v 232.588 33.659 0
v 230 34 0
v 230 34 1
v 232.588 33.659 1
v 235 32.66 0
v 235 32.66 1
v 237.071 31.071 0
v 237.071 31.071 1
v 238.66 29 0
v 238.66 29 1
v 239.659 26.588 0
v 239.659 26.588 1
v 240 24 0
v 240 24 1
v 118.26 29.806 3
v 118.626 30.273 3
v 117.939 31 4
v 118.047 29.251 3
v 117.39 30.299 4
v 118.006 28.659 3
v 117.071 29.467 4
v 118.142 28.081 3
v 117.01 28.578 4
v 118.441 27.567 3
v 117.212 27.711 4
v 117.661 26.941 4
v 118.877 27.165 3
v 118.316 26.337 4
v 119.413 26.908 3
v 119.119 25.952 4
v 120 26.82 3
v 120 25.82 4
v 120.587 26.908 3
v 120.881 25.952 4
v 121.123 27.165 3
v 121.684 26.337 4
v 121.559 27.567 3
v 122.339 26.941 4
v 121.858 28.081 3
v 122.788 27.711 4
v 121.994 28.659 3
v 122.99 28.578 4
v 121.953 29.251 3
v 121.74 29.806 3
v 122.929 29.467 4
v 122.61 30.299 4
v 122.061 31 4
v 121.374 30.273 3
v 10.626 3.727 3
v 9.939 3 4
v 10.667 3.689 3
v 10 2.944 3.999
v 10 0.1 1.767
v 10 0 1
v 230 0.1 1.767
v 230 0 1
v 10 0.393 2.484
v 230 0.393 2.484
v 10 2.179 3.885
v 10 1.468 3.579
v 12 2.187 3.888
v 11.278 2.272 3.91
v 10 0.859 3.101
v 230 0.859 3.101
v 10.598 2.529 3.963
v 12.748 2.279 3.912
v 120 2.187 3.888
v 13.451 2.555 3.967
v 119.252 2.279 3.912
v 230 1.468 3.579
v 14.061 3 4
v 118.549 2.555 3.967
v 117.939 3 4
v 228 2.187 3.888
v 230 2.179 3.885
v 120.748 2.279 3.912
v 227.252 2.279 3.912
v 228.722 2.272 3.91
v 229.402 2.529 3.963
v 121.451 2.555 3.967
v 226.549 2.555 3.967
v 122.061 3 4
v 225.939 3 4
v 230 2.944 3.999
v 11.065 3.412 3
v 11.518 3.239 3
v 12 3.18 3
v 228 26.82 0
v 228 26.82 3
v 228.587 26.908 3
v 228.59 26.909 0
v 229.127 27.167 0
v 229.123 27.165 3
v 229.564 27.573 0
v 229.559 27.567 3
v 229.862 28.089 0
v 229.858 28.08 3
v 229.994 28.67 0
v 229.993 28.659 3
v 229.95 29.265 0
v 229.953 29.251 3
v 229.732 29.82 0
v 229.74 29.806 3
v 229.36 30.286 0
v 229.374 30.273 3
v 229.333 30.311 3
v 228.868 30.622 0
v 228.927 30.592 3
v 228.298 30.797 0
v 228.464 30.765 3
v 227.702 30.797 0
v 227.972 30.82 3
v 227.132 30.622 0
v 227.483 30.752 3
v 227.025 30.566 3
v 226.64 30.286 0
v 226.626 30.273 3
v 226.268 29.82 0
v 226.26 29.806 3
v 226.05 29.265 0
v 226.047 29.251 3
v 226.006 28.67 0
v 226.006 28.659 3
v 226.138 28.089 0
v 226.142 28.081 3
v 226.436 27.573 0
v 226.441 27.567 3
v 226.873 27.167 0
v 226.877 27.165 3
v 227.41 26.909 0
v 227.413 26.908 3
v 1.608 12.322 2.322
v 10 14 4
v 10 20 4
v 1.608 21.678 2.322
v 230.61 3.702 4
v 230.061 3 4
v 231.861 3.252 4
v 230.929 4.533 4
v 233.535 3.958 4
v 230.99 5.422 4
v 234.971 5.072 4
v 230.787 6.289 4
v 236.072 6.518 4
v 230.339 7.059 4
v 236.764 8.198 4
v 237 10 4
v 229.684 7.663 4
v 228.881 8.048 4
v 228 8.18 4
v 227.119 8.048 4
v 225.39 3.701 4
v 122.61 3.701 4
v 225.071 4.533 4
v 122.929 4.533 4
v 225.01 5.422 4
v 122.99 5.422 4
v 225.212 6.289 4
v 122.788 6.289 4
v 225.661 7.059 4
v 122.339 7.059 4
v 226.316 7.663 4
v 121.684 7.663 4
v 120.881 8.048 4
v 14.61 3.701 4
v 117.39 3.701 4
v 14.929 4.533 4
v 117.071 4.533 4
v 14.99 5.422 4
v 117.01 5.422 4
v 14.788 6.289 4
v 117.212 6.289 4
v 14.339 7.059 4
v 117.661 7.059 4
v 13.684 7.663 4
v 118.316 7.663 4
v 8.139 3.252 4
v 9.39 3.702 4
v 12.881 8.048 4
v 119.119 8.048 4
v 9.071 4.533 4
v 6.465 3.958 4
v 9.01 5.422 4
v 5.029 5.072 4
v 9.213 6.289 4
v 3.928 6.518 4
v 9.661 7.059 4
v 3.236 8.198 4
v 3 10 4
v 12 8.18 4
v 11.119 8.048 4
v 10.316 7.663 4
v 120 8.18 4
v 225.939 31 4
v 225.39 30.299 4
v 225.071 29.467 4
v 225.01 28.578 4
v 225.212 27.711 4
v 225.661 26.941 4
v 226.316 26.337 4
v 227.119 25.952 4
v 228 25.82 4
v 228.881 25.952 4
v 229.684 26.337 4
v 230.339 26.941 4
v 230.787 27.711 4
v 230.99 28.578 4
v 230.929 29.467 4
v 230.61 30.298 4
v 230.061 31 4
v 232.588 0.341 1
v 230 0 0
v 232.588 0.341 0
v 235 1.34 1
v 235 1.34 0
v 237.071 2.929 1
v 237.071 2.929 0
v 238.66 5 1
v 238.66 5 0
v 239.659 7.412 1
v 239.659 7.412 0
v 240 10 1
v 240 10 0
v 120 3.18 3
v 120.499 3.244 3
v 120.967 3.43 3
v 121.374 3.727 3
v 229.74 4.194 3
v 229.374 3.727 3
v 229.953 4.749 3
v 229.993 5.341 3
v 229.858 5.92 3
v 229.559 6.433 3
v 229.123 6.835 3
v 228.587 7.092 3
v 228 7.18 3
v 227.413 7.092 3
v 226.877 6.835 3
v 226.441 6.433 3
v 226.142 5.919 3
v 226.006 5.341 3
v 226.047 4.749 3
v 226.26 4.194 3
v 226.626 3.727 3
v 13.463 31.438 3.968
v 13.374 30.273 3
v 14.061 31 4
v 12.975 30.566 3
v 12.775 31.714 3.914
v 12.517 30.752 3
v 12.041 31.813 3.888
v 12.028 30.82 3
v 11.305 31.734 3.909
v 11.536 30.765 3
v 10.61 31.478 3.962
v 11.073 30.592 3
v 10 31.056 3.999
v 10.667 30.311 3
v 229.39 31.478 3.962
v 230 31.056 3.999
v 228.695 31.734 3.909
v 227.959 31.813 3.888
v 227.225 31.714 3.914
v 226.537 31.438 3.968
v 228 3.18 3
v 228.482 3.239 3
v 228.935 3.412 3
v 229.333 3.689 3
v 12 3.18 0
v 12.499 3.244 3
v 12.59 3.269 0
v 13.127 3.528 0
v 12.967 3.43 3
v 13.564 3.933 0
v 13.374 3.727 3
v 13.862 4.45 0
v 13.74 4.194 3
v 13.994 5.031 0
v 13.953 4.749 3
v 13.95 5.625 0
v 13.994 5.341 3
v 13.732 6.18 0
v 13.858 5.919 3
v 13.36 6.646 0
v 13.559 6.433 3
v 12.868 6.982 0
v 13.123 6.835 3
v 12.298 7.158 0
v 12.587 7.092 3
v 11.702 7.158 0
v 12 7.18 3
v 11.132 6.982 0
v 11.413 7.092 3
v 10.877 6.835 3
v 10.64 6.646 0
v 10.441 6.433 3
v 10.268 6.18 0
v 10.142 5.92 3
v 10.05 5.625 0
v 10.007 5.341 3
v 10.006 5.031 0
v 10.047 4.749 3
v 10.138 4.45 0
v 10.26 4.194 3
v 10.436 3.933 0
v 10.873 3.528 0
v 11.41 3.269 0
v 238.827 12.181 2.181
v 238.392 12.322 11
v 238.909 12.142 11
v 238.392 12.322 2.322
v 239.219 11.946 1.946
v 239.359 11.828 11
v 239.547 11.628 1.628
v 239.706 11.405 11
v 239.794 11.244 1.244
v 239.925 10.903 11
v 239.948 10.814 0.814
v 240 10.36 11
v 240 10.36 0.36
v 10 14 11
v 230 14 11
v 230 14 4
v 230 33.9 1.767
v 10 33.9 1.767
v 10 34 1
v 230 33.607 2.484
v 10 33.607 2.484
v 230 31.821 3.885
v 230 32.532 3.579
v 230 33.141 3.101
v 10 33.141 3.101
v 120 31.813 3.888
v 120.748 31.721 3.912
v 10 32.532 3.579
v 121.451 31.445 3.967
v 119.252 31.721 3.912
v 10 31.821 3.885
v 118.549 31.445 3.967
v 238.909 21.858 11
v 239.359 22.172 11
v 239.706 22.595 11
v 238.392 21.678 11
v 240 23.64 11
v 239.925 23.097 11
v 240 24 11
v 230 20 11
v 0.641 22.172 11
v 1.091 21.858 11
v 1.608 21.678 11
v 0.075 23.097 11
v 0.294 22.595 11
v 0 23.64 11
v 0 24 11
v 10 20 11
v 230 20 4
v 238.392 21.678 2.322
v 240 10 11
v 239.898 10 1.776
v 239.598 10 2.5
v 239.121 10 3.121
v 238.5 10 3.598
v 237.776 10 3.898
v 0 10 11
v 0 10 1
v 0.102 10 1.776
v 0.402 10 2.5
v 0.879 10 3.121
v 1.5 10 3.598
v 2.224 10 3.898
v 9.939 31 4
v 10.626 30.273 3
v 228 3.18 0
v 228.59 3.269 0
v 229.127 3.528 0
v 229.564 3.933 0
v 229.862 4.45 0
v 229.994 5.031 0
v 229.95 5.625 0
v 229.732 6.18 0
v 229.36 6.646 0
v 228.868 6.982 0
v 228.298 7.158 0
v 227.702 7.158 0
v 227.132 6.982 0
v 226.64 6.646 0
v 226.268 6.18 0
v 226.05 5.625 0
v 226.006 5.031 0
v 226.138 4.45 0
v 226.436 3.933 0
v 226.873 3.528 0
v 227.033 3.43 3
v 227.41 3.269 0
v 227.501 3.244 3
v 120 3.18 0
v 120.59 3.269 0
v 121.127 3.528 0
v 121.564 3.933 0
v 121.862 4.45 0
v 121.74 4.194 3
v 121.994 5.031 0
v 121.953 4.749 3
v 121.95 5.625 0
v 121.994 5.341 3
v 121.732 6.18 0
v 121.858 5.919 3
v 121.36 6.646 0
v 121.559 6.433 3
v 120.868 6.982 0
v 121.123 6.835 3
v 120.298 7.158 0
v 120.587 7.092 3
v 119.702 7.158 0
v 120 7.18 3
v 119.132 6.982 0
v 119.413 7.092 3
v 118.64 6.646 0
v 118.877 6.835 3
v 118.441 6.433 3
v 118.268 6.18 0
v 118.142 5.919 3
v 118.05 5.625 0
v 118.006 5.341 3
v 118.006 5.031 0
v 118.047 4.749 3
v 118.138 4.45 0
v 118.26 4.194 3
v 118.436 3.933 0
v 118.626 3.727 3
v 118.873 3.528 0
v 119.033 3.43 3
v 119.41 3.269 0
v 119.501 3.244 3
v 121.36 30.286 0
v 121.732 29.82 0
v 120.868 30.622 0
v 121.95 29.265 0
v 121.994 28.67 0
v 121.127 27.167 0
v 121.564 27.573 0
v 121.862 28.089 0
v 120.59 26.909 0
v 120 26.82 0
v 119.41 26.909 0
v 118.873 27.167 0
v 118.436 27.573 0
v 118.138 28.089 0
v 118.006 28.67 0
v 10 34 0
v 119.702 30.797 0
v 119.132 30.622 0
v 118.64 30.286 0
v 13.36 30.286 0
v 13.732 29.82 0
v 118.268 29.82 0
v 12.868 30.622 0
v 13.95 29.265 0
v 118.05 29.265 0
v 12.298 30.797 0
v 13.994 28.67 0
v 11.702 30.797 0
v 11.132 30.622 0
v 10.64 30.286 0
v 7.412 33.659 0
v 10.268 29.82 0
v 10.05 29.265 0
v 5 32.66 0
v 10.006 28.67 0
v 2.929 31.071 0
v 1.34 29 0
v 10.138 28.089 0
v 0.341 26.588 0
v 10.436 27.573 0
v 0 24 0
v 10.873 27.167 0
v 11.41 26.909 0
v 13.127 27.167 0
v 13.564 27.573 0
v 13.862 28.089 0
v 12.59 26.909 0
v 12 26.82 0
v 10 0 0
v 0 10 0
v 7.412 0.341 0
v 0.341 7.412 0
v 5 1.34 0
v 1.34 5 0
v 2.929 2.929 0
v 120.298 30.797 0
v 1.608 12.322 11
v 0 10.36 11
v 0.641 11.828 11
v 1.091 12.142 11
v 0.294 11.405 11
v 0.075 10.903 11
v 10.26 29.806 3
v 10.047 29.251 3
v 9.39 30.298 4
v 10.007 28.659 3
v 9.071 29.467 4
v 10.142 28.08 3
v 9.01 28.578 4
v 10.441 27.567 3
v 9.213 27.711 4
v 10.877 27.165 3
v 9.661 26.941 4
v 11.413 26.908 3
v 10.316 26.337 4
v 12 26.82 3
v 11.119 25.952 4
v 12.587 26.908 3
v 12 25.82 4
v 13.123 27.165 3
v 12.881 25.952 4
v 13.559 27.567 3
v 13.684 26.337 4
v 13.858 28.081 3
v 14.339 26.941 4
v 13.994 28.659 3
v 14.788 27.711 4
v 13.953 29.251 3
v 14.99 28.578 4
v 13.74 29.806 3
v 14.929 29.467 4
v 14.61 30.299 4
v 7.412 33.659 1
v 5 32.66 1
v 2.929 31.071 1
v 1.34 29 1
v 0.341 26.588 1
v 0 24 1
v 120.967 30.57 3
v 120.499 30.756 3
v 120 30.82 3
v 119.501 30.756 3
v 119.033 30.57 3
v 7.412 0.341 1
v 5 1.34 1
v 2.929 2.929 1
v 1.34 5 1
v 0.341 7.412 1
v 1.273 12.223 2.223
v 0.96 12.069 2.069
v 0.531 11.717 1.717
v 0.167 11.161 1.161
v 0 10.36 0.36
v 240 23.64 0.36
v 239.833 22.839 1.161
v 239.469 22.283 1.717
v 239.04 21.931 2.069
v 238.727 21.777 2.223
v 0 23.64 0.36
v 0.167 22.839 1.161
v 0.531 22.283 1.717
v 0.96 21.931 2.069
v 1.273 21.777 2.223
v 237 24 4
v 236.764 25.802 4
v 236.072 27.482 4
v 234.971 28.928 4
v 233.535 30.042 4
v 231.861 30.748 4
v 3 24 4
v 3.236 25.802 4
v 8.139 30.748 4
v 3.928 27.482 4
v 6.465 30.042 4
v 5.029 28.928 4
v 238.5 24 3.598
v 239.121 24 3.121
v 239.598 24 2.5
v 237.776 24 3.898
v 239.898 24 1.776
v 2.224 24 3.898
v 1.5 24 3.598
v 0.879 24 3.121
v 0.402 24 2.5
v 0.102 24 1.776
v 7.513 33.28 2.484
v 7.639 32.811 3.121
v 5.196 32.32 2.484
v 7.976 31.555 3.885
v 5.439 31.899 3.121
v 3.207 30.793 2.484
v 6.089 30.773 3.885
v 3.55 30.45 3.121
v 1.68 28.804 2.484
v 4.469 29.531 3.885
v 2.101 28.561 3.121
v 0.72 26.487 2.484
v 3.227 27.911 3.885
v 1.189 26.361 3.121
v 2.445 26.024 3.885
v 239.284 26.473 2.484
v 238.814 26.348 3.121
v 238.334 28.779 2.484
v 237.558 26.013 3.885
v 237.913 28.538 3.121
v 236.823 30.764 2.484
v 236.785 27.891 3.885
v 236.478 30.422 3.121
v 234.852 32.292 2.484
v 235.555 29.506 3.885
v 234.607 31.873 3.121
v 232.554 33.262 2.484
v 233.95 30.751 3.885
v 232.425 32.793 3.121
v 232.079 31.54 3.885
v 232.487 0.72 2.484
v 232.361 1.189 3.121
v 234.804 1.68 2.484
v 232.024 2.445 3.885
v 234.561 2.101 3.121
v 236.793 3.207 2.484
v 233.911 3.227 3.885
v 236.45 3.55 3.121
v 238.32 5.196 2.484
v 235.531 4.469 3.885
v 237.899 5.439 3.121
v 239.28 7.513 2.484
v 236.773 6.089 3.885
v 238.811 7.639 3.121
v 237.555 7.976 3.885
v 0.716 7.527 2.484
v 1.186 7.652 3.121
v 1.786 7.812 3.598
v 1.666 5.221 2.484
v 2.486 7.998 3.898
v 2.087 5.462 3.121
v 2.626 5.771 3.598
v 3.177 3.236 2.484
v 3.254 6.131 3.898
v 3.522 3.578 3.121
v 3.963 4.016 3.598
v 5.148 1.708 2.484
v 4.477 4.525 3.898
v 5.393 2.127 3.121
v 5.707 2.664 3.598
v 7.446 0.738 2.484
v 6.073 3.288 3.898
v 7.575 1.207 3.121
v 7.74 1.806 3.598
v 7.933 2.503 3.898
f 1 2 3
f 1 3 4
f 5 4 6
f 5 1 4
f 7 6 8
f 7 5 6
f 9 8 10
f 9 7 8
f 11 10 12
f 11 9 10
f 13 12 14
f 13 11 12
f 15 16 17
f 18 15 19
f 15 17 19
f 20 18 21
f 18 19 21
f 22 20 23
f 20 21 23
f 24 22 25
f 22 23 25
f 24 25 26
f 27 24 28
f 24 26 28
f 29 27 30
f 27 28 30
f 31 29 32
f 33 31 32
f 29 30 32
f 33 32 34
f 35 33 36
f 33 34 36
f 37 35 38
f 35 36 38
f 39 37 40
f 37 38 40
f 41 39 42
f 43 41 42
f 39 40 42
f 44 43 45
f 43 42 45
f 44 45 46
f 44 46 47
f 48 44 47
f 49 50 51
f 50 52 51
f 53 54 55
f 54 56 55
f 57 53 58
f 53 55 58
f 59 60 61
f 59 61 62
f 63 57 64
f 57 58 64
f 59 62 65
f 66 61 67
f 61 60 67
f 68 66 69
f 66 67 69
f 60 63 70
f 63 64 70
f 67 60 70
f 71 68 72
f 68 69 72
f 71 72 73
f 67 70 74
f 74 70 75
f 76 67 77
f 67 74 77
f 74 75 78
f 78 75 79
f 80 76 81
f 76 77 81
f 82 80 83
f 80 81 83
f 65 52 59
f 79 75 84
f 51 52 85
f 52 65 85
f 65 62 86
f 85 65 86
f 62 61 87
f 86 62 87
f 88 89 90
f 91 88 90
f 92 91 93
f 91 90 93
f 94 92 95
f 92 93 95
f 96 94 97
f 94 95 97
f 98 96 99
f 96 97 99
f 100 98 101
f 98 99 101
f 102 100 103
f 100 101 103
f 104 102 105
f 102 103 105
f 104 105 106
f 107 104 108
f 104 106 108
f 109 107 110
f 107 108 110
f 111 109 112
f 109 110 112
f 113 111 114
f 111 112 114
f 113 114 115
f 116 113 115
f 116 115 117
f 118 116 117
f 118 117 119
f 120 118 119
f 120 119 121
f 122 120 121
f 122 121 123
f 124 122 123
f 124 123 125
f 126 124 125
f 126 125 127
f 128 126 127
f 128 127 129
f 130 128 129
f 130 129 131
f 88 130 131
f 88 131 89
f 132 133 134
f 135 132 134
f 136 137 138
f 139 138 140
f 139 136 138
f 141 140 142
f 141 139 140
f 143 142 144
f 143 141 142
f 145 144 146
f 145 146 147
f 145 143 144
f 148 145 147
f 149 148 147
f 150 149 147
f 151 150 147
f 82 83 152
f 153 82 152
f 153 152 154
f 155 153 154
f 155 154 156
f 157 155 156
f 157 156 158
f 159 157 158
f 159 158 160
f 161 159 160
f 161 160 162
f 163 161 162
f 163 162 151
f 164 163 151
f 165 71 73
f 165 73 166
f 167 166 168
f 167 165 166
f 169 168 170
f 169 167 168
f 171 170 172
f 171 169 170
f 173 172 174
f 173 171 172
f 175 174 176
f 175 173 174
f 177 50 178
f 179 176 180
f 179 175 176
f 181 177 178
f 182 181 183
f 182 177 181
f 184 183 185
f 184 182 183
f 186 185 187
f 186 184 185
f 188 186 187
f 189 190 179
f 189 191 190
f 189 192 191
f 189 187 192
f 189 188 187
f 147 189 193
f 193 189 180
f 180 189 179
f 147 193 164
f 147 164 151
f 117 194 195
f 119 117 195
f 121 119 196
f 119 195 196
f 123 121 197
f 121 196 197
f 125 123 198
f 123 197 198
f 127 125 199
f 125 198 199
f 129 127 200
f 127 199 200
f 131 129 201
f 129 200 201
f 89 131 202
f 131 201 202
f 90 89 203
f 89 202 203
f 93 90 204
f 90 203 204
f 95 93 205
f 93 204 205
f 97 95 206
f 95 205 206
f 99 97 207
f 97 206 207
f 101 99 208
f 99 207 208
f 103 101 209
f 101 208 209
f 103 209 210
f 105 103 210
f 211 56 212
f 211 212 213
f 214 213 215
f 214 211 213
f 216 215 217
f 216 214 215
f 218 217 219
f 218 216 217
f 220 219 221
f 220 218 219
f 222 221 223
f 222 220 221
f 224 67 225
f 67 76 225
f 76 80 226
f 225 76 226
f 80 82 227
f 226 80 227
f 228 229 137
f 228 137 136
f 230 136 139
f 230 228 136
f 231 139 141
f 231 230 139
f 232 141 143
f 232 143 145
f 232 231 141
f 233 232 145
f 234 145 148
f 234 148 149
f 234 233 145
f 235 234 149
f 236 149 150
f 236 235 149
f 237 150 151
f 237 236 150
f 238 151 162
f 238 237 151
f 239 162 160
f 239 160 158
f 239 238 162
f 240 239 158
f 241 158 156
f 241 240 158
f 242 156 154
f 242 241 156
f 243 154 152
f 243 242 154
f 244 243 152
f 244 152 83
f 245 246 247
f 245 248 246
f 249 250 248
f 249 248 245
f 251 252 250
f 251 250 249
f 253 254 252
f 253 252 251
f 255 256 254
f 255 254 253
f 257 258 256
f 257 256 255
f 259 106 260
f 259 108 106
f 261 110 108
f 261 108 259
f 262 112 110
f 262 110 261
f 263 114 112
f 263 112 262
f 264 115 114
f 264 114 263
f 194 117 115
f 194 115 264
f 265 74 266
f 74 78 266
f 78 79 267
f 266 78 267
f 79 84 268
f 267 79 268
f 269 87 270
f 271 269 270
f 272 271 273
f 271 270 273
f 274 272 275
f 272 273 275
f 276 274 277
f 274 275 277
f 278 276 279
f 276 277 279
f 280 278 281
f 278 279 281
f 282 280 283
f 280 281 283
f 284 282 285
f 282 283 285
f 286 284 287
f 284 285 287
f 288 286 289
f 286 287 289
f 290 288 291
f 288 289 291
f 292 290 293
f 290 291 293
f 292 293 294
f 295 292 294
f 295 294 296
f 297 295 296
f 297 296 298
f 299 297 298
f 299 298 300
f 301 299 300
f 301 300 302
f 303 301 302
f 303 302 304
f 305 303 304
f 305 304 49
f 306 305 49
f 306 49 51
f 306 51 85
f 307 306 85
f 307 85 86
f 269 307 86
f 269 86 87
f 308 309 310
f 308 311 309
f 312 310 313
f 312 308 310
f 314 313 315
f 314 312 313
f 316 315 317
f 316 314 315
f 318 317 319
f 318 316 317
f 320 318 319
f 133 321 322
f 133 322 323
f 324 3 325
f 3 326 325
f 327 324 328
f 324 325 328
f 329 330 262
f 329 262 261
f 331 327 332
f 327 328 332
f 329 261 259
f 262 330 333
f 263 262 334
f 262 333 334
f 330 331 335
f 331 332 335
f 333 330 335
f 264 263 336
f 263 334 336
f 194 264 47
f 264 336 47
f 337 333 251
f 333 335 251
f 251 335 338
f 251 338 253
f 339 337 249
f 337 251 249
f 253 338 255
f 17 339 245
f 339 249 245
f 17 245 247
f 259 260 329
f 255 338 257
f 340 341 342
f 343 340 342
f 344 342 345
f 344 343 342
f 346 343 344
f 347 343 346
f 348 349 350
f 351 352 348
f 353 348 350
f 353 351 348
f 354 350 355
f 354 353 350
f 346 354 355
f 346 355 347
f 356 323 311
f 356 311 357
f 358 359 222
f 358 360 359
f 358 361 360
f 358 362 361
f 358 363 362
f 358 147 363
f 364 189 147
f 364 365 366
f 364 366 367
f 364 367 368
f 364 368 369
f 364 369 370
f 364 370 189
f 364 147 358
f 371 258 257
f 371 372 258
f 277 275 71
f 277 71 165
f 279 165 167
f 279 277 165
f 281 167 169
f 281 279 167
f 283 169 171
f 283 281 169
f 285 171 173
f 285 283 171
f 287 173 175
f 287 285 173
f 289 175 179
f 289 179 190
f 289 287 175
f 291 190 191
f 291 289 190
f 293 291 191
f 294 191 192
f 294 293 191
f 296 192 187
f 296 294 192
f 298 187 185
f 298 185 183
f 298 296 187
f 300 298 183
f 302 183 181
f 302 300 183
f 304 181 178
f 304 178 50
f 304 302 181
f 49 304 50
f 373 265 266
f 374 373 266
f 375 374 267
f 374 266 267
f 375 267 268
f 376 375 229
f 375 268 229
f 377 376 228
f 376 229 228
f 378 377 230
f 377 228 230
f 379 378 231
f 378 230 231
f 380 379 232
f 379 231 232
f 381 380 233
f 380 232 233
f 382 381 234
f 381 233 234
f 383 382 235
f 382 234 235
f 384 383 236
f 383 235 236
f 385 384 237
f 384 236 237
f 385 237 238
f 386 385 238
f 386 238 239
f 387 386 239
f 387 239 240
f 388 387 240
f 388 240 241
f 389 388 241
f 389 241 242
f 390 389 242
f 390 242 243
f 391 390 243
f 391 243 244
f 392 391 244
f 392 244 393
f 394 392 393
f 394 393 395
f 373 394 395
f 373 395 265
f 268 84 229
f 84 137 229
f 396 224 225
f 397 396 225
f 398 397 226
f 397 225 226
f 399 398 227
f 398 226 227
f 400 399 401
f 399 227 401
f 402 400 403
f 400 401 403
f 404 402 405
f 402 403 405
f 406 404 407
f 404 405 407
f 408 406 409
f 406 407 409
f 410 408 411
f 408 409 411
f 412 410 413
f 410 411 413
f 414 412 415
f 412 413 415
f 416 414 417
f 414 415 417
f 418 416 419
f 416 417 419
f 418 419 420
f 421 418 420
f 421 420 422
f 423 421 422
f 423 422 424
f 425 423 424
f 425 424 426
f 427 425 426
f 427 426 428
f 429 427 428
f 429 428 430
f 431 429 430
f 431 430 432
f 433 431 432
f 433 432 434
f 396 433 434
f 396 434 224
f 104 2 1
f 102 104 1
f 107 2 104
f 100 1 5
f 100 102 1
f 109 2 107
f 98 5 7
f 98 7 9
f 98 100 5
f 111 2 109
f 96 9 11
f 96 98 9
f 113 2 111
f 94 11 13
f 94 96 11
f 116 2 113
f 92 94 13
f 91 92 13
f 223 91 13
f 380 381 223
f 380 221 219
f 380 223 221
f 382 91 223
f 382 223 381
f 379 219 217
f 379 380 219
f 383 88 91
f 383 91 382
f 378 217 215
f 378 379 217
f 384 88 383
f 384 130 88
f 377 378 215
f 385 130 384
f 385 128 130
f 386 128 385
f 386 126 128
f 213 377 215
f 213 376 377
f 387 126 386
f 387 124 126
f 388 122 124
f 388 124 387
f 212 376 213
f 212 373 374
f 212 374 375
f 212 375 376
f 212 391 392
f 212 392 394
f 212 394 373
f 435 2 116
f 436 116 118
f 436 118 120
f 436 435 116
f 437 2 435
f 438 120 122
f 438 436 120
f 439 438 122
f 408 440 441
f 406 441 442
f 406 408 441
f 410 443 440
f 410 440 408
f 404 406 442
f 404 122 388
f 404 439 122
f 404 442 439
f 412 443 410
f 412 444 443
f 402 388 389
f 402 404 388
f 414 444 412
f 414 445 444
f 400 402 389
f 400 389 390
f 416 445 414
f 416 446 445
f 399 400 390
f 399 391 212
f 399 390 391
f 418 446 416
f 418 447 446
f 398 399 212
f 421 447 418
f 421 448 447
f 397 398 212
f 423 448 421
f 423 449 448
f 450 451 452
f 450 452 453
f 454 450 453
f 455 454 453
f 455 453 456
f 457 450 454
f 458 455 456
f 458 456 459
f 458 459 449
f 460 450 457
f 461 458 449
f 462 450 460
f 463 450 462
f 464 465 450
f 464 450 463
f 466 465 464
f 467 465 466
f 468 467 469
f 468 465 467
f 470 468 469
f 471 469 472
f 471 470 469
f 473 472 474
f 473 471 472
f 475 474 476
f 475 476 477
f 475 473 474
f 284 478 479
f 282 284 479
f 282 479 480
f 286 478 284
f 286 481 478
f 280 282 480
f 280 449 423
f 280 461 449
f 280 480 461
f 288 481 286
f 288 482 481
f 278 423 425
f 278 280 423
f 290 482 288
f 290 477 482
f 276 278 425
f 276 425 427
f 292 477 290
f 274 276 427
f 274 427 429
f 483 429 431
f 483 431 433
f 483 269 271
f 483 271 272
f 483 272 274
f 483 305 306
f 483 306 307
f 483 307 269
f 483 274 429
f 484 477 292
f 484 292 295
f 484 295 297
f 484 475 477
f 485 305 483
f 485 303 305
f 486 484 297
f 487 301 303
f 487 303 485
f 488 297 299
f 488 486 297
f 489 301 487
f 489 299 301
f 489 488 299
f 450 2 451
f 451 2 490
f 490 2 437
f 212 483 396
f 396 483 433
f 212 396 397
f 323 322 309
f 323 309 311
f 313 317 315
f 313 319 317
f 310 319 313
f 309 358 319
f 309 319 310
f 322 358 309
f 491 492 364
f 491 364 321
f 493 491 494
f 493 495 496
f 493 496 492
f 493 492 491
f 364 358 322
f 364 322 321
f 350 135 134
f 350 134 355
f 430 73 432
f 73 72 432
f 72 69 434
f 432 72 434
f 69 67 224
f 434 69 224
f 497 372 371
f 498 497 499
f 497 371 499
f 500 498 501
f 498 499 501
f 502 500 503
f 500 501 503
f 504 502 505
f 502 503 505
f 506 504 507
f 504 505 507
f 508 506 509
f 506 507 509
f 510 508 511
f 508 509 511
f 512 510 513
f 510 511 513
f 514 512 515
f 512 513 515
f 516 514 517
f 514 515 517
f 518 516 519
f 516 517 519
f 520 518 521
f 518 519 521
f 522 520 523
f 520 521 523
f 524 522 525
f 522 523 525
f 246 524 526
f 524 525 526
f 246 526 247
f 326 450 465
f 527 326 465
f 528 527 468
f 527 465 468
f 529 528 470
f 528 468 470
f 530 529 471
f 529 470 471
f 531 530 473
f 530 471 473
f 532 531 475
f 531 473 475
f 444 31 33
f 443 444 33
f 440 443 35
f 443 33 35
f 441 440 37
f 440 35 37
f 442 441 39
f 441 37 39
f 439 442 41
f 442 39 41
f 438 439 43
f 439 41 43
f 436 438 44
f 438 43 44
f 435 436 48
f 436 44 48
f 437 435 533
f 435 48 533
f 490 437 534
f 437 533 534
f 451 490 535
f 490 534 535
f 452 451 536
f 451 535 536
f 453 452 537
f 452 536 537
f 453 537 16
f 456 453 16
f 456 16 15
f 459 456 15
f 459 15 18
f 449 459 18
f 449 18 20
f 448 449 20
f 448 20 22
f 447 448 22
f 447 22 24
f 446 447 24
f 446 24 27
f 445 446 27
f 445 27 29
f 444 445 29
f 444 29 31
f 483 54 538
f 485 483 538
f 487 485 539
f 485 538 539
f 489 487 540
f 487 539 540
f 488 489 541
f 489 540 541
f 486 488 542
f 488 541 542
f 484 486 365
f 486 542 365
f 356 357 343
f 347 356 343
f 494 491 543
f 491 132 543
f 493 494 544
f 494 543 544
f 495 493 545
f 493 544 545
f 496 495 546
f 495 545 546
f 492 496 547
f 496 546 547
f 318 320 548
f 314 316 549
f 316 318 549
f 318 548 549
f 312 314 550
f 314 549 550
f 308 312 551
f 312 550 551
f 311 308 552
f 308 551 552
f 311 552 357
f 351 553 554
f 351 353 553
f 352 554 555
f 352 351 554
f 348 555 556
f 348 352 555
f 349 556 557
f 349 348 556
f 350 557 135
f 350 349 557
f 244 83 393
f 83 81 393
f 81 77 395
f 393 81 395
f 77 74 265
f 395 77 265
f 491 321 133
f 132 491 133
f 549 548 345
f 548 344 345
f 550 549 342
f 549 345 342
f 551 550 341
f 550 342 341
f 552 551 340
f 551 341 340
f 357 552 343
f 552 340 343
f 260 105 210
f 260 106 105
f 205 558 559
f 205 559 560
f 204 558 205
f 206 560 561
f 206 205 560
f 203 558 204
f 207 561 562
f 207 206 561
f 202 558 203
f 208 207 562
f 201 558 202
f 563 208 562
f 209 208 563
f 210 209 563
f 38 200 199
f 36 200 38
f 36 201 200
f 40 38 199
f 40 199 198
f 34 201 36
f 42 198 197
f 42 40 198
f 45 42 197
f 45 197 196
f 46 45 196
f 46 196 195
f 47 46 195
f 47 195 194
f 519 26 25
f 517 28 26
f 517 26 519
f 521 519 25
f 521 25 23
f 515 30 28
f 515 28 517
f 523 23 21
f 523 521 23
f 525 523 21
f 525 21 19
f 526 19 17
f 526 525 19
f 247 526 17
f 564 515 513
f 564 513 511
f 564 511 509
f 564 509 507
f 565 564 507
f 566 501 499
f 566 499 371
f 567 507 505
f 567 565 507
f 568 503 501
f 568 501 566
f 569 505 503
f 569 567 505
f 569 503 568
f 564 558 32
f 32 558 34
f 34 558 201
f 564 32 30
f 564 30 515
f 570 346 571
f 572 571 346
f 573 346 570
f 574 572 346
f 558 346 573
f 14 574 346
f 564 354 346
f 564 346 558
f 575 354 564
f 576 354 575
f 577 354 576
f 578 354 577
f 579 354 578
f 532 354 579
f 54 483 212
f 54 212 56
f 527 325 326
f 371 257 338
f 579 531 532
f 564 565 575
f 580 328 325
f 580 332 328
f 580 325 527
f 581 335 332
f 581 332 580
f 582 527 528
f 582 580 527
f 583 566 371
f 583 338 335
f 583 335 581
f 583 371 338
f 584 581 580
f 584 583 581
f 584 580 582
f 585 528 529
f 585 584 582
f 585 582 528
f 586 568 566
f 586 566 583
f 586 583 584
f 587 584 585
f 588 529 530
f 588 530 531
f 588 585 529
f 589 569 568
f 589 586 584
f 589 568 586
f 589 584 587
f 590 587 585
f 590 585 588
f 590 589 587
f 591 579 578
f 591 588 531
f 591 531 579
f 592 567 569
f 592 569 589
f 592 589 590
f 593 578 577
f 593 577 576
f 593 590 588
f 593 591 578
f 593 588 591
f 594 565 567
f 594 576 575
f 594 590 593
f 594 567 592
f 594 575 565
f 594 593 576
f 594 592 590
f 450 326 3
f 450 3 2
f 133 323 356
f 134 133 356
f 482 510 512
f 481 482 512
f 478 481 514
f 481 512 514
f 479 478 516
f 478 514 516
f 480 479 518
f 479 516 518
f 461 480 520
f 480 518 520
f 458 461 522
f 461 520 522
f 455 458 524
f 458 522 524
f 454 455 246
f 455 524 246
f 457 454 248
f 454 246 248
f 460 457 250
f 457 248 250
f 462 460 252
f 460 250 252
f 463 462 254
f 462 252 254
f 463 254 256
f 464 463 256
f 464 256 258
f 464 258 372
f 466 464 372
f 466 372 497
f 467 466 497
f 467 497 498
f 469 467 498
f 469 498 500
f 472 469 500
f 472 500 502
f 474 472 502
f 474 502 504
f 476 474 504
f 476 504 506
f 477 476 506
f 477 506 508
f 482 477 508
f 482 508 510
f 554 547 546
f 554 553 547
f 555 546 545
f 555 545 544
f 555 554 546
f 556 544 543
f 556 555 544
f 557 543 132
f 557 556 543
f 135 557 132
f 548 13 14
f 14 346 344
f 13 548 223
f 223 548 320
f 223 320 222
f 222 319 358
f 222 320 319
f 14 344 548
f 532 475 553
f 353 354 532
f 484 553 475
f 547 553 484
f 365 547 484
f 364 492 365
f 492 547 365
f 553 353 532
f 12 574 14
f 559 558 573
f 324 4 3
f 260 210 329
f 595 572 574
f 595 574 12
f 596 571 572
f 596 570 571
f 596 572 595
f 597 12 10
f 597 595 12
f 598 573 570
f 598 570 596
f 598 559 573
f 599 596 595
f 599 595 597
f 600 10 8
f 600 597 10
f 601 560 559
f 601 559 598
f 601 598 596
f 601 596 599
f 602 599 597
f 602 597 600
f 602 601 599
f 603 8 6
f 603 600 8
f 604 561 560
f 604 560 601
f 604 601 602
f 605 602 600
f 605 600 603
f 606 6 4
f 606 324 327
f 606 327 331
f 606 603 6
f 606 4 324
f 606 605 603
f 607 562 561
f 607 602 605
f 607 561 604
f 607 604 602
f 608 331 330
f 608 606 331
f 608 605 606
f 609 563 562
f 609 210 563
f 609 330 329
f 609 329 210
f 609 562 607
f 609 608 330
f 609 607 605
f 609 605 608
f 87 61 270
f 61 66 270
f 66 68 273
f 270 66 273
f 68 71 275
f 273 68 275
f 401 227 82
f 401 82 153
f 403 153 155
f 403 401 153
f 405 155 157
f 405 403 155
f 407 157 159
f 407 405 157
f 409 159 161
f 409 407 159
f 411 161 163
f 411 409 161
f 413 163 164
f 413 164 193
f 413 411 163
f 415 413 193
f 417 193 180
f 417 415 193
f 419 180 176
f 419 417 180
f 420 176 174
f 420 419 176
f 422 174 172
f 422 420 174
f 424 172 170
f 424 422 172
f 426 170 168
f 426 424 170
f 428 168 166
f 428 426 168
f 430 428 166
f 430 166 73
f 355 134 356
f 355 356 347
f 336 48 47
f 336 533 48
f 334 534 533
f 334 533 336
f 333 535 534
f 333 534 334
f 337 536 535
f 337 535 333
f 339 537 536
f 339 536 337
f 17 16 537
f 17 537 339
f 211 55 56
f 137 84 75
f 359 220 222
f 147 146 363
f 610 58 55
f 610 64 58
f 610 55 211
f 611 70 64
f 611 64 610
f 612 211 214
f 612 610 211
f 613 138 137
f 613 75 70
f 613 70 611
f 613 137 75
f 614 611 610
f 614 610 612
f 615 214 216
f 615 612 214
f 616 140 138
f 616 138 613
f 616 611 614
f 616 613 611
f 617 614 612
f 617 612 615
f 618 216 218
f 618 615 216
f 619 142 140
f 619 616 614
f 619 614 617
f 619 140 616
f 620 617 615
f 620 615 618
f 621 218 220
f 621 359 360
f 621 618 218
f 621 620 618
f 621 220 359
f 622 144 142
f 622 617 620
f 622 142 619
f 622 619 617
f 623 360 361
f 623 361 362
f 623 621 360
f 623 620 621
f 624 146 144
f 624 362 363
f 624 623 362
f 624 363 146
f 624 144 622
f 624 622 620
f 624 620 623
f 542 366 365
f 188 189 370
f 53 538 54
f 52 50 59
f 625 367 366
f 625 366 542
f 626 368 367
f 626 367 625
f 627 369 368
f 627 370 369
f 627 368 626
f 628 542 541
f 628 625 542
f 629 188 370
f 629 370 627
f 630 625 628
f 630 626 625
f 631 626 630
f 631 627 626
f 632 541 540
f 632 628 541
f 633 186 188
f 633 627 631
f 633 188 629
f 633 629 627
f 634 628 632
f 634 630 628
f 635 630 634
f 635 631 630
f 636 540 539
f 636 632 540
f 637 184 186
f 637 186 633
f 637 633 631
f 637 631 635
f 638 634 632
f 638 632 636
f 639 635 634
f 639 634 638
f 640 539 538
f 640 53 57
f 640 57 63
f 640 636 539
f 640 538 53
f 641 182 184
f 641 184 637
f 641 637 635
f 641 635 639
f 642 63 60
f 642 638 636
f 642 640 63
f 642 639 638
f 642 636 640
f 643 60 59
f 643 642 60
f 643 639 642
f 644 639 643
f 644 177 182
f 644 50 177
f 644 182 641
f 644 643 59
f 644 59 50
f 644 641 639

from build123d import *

# Parameters (mm, degrees)
PAD_DEPTH       = 240
FILLET_R        = 10
FILLET001_R     = 3
CHAMFER_1_SIZE2 = 10
CHAMFER_1_SIZE  = 2
CHAMFER_2_SIZE2 = 10
CHAMFER_2_SIZE  = 2
FILLET002_R     = 2
SKETCH001_R     = 2
POCKET_DEPTH    = 4.001
CHAMFER001_SIZE = 1


with BuildPart() as part:
    # Sketch → Pad (new body)
    with BuildSketch(Plane.YZ):
        Polygon((0, 0), (0, 4), (10, 4), (10, 11), (14, 11), (14, 4), (20, 4), (20, 11), (24, 11), (24, 4), (34, 4), (34, 0), align=None)
    extrude(amount=PAD_DEPTH)

    # Fillet
    fillet_edges = [part.edges().sort_by_distance(p)[0] for p in [
        (240, 0, 2),
        (240, 34, 2),
        (0, 0, 2),
        (0, 34, 2),
    ]]
    fillet(fillet_edges, radius=FILLET_R)

    # Fillet001
    fillet001_edges = [part.edges().sort_by_distance(p)[0] for p in [
        (237.071068, 2.928932, 4),
        (120, 0, 4),
        (2.928932, 2.928932, 4),
        (2.928932, 31.071068, 4),
        (120, 34, 4),
        (237.071068, 31.071068, 4),
    ]]
    fillet(fillet001_edges, radius=FILLET001_R)

    # Chamfer 1
    chamfer_1_edges = [part.edges().sort_by_distance(p)[0] for p in [
        (240, 17, 4),
        (240, 20, 7.5),
        (240, 14, 7.5),
    ]]
    chamfer_1_side = part.faces().sort_by_distance((240, 23.821955, 0.5))[0]
    chamfer(chamfer_1_edges, length=CHAMFER_1_SIZE, length2=CHAMFER_1_SIZE2, reference=chamfer_1_side)

    # Chamfer 2
    chamfer_2_edges = [part.edges().sort_by_distance(p)[0] for p in [
        (0, 17, 4),
        (0, 20, 7.5),
        (0, 14, 7.5),
    ]]
    chamfer_2_side = part.faces().sort_by_distance((0, 23.821955, 0.5))[0]
    chamfer(chamfer_2_edges, length=CHAMFER_2_SIZE, length2=CHAMFER_2_SIZE2, reference=chamfer_2_side)

    # Fillet002
    fillet002_edges = [part.edges().sort_by_distance(p)[0] for p in [
        (240, 12, 6.5),
        (240, 17, 2),
        (240, 22, 6.5),
        (0, 22, 6.5),
        (0, 17, 2),
        (0, 12, 6.5),
    ]]
    fillet(fillet002_edges, radius=FILLET002_R)

    # Sketch001 (on Face29 of Fillet002) → Pocket (cut, through all)
    with BuildSketch(Plane(origin=(0, 0, 4), x_dir=(0, -1, 0), z_dir=(0, 0, 1))):
        with Locations((-28.819804, 12)):
            Circle(SKETCH001_R)
        with Locations((-5.180196, 12)):
            Circle(SKETCH001_R)
        with Locations((-5.180196, 120)):
            Circle(SKETCH001_R)
        with Locations((-28.819804, 120)):
            Circle(SKETCH001_R)
        with Locations((-28.819804, 228)):
            Circle(SKETCH001_R)
        with Locations((-5.180196, 228)):
            Circle(SKETCH001_R)
    extrude(amount=-POCKET_DEPTH, mode=Mode.SUBTRACT)

    # Chamfer001
    chamfer001_edges = [part.edges().sort_by_distance(p)[0] for p in [
        (12, 30.819804, 4),
        (12, 7.180196, 4),
        (120, 7.180196, 4),
        (120, 30.819804, 4),
        (228, 30.819804, 4),
        (228, 7.180196, 4),
    ]]
    chamfer(chamfer001_edges, length=CHAMFER001_SIZE)


solid = part.part
